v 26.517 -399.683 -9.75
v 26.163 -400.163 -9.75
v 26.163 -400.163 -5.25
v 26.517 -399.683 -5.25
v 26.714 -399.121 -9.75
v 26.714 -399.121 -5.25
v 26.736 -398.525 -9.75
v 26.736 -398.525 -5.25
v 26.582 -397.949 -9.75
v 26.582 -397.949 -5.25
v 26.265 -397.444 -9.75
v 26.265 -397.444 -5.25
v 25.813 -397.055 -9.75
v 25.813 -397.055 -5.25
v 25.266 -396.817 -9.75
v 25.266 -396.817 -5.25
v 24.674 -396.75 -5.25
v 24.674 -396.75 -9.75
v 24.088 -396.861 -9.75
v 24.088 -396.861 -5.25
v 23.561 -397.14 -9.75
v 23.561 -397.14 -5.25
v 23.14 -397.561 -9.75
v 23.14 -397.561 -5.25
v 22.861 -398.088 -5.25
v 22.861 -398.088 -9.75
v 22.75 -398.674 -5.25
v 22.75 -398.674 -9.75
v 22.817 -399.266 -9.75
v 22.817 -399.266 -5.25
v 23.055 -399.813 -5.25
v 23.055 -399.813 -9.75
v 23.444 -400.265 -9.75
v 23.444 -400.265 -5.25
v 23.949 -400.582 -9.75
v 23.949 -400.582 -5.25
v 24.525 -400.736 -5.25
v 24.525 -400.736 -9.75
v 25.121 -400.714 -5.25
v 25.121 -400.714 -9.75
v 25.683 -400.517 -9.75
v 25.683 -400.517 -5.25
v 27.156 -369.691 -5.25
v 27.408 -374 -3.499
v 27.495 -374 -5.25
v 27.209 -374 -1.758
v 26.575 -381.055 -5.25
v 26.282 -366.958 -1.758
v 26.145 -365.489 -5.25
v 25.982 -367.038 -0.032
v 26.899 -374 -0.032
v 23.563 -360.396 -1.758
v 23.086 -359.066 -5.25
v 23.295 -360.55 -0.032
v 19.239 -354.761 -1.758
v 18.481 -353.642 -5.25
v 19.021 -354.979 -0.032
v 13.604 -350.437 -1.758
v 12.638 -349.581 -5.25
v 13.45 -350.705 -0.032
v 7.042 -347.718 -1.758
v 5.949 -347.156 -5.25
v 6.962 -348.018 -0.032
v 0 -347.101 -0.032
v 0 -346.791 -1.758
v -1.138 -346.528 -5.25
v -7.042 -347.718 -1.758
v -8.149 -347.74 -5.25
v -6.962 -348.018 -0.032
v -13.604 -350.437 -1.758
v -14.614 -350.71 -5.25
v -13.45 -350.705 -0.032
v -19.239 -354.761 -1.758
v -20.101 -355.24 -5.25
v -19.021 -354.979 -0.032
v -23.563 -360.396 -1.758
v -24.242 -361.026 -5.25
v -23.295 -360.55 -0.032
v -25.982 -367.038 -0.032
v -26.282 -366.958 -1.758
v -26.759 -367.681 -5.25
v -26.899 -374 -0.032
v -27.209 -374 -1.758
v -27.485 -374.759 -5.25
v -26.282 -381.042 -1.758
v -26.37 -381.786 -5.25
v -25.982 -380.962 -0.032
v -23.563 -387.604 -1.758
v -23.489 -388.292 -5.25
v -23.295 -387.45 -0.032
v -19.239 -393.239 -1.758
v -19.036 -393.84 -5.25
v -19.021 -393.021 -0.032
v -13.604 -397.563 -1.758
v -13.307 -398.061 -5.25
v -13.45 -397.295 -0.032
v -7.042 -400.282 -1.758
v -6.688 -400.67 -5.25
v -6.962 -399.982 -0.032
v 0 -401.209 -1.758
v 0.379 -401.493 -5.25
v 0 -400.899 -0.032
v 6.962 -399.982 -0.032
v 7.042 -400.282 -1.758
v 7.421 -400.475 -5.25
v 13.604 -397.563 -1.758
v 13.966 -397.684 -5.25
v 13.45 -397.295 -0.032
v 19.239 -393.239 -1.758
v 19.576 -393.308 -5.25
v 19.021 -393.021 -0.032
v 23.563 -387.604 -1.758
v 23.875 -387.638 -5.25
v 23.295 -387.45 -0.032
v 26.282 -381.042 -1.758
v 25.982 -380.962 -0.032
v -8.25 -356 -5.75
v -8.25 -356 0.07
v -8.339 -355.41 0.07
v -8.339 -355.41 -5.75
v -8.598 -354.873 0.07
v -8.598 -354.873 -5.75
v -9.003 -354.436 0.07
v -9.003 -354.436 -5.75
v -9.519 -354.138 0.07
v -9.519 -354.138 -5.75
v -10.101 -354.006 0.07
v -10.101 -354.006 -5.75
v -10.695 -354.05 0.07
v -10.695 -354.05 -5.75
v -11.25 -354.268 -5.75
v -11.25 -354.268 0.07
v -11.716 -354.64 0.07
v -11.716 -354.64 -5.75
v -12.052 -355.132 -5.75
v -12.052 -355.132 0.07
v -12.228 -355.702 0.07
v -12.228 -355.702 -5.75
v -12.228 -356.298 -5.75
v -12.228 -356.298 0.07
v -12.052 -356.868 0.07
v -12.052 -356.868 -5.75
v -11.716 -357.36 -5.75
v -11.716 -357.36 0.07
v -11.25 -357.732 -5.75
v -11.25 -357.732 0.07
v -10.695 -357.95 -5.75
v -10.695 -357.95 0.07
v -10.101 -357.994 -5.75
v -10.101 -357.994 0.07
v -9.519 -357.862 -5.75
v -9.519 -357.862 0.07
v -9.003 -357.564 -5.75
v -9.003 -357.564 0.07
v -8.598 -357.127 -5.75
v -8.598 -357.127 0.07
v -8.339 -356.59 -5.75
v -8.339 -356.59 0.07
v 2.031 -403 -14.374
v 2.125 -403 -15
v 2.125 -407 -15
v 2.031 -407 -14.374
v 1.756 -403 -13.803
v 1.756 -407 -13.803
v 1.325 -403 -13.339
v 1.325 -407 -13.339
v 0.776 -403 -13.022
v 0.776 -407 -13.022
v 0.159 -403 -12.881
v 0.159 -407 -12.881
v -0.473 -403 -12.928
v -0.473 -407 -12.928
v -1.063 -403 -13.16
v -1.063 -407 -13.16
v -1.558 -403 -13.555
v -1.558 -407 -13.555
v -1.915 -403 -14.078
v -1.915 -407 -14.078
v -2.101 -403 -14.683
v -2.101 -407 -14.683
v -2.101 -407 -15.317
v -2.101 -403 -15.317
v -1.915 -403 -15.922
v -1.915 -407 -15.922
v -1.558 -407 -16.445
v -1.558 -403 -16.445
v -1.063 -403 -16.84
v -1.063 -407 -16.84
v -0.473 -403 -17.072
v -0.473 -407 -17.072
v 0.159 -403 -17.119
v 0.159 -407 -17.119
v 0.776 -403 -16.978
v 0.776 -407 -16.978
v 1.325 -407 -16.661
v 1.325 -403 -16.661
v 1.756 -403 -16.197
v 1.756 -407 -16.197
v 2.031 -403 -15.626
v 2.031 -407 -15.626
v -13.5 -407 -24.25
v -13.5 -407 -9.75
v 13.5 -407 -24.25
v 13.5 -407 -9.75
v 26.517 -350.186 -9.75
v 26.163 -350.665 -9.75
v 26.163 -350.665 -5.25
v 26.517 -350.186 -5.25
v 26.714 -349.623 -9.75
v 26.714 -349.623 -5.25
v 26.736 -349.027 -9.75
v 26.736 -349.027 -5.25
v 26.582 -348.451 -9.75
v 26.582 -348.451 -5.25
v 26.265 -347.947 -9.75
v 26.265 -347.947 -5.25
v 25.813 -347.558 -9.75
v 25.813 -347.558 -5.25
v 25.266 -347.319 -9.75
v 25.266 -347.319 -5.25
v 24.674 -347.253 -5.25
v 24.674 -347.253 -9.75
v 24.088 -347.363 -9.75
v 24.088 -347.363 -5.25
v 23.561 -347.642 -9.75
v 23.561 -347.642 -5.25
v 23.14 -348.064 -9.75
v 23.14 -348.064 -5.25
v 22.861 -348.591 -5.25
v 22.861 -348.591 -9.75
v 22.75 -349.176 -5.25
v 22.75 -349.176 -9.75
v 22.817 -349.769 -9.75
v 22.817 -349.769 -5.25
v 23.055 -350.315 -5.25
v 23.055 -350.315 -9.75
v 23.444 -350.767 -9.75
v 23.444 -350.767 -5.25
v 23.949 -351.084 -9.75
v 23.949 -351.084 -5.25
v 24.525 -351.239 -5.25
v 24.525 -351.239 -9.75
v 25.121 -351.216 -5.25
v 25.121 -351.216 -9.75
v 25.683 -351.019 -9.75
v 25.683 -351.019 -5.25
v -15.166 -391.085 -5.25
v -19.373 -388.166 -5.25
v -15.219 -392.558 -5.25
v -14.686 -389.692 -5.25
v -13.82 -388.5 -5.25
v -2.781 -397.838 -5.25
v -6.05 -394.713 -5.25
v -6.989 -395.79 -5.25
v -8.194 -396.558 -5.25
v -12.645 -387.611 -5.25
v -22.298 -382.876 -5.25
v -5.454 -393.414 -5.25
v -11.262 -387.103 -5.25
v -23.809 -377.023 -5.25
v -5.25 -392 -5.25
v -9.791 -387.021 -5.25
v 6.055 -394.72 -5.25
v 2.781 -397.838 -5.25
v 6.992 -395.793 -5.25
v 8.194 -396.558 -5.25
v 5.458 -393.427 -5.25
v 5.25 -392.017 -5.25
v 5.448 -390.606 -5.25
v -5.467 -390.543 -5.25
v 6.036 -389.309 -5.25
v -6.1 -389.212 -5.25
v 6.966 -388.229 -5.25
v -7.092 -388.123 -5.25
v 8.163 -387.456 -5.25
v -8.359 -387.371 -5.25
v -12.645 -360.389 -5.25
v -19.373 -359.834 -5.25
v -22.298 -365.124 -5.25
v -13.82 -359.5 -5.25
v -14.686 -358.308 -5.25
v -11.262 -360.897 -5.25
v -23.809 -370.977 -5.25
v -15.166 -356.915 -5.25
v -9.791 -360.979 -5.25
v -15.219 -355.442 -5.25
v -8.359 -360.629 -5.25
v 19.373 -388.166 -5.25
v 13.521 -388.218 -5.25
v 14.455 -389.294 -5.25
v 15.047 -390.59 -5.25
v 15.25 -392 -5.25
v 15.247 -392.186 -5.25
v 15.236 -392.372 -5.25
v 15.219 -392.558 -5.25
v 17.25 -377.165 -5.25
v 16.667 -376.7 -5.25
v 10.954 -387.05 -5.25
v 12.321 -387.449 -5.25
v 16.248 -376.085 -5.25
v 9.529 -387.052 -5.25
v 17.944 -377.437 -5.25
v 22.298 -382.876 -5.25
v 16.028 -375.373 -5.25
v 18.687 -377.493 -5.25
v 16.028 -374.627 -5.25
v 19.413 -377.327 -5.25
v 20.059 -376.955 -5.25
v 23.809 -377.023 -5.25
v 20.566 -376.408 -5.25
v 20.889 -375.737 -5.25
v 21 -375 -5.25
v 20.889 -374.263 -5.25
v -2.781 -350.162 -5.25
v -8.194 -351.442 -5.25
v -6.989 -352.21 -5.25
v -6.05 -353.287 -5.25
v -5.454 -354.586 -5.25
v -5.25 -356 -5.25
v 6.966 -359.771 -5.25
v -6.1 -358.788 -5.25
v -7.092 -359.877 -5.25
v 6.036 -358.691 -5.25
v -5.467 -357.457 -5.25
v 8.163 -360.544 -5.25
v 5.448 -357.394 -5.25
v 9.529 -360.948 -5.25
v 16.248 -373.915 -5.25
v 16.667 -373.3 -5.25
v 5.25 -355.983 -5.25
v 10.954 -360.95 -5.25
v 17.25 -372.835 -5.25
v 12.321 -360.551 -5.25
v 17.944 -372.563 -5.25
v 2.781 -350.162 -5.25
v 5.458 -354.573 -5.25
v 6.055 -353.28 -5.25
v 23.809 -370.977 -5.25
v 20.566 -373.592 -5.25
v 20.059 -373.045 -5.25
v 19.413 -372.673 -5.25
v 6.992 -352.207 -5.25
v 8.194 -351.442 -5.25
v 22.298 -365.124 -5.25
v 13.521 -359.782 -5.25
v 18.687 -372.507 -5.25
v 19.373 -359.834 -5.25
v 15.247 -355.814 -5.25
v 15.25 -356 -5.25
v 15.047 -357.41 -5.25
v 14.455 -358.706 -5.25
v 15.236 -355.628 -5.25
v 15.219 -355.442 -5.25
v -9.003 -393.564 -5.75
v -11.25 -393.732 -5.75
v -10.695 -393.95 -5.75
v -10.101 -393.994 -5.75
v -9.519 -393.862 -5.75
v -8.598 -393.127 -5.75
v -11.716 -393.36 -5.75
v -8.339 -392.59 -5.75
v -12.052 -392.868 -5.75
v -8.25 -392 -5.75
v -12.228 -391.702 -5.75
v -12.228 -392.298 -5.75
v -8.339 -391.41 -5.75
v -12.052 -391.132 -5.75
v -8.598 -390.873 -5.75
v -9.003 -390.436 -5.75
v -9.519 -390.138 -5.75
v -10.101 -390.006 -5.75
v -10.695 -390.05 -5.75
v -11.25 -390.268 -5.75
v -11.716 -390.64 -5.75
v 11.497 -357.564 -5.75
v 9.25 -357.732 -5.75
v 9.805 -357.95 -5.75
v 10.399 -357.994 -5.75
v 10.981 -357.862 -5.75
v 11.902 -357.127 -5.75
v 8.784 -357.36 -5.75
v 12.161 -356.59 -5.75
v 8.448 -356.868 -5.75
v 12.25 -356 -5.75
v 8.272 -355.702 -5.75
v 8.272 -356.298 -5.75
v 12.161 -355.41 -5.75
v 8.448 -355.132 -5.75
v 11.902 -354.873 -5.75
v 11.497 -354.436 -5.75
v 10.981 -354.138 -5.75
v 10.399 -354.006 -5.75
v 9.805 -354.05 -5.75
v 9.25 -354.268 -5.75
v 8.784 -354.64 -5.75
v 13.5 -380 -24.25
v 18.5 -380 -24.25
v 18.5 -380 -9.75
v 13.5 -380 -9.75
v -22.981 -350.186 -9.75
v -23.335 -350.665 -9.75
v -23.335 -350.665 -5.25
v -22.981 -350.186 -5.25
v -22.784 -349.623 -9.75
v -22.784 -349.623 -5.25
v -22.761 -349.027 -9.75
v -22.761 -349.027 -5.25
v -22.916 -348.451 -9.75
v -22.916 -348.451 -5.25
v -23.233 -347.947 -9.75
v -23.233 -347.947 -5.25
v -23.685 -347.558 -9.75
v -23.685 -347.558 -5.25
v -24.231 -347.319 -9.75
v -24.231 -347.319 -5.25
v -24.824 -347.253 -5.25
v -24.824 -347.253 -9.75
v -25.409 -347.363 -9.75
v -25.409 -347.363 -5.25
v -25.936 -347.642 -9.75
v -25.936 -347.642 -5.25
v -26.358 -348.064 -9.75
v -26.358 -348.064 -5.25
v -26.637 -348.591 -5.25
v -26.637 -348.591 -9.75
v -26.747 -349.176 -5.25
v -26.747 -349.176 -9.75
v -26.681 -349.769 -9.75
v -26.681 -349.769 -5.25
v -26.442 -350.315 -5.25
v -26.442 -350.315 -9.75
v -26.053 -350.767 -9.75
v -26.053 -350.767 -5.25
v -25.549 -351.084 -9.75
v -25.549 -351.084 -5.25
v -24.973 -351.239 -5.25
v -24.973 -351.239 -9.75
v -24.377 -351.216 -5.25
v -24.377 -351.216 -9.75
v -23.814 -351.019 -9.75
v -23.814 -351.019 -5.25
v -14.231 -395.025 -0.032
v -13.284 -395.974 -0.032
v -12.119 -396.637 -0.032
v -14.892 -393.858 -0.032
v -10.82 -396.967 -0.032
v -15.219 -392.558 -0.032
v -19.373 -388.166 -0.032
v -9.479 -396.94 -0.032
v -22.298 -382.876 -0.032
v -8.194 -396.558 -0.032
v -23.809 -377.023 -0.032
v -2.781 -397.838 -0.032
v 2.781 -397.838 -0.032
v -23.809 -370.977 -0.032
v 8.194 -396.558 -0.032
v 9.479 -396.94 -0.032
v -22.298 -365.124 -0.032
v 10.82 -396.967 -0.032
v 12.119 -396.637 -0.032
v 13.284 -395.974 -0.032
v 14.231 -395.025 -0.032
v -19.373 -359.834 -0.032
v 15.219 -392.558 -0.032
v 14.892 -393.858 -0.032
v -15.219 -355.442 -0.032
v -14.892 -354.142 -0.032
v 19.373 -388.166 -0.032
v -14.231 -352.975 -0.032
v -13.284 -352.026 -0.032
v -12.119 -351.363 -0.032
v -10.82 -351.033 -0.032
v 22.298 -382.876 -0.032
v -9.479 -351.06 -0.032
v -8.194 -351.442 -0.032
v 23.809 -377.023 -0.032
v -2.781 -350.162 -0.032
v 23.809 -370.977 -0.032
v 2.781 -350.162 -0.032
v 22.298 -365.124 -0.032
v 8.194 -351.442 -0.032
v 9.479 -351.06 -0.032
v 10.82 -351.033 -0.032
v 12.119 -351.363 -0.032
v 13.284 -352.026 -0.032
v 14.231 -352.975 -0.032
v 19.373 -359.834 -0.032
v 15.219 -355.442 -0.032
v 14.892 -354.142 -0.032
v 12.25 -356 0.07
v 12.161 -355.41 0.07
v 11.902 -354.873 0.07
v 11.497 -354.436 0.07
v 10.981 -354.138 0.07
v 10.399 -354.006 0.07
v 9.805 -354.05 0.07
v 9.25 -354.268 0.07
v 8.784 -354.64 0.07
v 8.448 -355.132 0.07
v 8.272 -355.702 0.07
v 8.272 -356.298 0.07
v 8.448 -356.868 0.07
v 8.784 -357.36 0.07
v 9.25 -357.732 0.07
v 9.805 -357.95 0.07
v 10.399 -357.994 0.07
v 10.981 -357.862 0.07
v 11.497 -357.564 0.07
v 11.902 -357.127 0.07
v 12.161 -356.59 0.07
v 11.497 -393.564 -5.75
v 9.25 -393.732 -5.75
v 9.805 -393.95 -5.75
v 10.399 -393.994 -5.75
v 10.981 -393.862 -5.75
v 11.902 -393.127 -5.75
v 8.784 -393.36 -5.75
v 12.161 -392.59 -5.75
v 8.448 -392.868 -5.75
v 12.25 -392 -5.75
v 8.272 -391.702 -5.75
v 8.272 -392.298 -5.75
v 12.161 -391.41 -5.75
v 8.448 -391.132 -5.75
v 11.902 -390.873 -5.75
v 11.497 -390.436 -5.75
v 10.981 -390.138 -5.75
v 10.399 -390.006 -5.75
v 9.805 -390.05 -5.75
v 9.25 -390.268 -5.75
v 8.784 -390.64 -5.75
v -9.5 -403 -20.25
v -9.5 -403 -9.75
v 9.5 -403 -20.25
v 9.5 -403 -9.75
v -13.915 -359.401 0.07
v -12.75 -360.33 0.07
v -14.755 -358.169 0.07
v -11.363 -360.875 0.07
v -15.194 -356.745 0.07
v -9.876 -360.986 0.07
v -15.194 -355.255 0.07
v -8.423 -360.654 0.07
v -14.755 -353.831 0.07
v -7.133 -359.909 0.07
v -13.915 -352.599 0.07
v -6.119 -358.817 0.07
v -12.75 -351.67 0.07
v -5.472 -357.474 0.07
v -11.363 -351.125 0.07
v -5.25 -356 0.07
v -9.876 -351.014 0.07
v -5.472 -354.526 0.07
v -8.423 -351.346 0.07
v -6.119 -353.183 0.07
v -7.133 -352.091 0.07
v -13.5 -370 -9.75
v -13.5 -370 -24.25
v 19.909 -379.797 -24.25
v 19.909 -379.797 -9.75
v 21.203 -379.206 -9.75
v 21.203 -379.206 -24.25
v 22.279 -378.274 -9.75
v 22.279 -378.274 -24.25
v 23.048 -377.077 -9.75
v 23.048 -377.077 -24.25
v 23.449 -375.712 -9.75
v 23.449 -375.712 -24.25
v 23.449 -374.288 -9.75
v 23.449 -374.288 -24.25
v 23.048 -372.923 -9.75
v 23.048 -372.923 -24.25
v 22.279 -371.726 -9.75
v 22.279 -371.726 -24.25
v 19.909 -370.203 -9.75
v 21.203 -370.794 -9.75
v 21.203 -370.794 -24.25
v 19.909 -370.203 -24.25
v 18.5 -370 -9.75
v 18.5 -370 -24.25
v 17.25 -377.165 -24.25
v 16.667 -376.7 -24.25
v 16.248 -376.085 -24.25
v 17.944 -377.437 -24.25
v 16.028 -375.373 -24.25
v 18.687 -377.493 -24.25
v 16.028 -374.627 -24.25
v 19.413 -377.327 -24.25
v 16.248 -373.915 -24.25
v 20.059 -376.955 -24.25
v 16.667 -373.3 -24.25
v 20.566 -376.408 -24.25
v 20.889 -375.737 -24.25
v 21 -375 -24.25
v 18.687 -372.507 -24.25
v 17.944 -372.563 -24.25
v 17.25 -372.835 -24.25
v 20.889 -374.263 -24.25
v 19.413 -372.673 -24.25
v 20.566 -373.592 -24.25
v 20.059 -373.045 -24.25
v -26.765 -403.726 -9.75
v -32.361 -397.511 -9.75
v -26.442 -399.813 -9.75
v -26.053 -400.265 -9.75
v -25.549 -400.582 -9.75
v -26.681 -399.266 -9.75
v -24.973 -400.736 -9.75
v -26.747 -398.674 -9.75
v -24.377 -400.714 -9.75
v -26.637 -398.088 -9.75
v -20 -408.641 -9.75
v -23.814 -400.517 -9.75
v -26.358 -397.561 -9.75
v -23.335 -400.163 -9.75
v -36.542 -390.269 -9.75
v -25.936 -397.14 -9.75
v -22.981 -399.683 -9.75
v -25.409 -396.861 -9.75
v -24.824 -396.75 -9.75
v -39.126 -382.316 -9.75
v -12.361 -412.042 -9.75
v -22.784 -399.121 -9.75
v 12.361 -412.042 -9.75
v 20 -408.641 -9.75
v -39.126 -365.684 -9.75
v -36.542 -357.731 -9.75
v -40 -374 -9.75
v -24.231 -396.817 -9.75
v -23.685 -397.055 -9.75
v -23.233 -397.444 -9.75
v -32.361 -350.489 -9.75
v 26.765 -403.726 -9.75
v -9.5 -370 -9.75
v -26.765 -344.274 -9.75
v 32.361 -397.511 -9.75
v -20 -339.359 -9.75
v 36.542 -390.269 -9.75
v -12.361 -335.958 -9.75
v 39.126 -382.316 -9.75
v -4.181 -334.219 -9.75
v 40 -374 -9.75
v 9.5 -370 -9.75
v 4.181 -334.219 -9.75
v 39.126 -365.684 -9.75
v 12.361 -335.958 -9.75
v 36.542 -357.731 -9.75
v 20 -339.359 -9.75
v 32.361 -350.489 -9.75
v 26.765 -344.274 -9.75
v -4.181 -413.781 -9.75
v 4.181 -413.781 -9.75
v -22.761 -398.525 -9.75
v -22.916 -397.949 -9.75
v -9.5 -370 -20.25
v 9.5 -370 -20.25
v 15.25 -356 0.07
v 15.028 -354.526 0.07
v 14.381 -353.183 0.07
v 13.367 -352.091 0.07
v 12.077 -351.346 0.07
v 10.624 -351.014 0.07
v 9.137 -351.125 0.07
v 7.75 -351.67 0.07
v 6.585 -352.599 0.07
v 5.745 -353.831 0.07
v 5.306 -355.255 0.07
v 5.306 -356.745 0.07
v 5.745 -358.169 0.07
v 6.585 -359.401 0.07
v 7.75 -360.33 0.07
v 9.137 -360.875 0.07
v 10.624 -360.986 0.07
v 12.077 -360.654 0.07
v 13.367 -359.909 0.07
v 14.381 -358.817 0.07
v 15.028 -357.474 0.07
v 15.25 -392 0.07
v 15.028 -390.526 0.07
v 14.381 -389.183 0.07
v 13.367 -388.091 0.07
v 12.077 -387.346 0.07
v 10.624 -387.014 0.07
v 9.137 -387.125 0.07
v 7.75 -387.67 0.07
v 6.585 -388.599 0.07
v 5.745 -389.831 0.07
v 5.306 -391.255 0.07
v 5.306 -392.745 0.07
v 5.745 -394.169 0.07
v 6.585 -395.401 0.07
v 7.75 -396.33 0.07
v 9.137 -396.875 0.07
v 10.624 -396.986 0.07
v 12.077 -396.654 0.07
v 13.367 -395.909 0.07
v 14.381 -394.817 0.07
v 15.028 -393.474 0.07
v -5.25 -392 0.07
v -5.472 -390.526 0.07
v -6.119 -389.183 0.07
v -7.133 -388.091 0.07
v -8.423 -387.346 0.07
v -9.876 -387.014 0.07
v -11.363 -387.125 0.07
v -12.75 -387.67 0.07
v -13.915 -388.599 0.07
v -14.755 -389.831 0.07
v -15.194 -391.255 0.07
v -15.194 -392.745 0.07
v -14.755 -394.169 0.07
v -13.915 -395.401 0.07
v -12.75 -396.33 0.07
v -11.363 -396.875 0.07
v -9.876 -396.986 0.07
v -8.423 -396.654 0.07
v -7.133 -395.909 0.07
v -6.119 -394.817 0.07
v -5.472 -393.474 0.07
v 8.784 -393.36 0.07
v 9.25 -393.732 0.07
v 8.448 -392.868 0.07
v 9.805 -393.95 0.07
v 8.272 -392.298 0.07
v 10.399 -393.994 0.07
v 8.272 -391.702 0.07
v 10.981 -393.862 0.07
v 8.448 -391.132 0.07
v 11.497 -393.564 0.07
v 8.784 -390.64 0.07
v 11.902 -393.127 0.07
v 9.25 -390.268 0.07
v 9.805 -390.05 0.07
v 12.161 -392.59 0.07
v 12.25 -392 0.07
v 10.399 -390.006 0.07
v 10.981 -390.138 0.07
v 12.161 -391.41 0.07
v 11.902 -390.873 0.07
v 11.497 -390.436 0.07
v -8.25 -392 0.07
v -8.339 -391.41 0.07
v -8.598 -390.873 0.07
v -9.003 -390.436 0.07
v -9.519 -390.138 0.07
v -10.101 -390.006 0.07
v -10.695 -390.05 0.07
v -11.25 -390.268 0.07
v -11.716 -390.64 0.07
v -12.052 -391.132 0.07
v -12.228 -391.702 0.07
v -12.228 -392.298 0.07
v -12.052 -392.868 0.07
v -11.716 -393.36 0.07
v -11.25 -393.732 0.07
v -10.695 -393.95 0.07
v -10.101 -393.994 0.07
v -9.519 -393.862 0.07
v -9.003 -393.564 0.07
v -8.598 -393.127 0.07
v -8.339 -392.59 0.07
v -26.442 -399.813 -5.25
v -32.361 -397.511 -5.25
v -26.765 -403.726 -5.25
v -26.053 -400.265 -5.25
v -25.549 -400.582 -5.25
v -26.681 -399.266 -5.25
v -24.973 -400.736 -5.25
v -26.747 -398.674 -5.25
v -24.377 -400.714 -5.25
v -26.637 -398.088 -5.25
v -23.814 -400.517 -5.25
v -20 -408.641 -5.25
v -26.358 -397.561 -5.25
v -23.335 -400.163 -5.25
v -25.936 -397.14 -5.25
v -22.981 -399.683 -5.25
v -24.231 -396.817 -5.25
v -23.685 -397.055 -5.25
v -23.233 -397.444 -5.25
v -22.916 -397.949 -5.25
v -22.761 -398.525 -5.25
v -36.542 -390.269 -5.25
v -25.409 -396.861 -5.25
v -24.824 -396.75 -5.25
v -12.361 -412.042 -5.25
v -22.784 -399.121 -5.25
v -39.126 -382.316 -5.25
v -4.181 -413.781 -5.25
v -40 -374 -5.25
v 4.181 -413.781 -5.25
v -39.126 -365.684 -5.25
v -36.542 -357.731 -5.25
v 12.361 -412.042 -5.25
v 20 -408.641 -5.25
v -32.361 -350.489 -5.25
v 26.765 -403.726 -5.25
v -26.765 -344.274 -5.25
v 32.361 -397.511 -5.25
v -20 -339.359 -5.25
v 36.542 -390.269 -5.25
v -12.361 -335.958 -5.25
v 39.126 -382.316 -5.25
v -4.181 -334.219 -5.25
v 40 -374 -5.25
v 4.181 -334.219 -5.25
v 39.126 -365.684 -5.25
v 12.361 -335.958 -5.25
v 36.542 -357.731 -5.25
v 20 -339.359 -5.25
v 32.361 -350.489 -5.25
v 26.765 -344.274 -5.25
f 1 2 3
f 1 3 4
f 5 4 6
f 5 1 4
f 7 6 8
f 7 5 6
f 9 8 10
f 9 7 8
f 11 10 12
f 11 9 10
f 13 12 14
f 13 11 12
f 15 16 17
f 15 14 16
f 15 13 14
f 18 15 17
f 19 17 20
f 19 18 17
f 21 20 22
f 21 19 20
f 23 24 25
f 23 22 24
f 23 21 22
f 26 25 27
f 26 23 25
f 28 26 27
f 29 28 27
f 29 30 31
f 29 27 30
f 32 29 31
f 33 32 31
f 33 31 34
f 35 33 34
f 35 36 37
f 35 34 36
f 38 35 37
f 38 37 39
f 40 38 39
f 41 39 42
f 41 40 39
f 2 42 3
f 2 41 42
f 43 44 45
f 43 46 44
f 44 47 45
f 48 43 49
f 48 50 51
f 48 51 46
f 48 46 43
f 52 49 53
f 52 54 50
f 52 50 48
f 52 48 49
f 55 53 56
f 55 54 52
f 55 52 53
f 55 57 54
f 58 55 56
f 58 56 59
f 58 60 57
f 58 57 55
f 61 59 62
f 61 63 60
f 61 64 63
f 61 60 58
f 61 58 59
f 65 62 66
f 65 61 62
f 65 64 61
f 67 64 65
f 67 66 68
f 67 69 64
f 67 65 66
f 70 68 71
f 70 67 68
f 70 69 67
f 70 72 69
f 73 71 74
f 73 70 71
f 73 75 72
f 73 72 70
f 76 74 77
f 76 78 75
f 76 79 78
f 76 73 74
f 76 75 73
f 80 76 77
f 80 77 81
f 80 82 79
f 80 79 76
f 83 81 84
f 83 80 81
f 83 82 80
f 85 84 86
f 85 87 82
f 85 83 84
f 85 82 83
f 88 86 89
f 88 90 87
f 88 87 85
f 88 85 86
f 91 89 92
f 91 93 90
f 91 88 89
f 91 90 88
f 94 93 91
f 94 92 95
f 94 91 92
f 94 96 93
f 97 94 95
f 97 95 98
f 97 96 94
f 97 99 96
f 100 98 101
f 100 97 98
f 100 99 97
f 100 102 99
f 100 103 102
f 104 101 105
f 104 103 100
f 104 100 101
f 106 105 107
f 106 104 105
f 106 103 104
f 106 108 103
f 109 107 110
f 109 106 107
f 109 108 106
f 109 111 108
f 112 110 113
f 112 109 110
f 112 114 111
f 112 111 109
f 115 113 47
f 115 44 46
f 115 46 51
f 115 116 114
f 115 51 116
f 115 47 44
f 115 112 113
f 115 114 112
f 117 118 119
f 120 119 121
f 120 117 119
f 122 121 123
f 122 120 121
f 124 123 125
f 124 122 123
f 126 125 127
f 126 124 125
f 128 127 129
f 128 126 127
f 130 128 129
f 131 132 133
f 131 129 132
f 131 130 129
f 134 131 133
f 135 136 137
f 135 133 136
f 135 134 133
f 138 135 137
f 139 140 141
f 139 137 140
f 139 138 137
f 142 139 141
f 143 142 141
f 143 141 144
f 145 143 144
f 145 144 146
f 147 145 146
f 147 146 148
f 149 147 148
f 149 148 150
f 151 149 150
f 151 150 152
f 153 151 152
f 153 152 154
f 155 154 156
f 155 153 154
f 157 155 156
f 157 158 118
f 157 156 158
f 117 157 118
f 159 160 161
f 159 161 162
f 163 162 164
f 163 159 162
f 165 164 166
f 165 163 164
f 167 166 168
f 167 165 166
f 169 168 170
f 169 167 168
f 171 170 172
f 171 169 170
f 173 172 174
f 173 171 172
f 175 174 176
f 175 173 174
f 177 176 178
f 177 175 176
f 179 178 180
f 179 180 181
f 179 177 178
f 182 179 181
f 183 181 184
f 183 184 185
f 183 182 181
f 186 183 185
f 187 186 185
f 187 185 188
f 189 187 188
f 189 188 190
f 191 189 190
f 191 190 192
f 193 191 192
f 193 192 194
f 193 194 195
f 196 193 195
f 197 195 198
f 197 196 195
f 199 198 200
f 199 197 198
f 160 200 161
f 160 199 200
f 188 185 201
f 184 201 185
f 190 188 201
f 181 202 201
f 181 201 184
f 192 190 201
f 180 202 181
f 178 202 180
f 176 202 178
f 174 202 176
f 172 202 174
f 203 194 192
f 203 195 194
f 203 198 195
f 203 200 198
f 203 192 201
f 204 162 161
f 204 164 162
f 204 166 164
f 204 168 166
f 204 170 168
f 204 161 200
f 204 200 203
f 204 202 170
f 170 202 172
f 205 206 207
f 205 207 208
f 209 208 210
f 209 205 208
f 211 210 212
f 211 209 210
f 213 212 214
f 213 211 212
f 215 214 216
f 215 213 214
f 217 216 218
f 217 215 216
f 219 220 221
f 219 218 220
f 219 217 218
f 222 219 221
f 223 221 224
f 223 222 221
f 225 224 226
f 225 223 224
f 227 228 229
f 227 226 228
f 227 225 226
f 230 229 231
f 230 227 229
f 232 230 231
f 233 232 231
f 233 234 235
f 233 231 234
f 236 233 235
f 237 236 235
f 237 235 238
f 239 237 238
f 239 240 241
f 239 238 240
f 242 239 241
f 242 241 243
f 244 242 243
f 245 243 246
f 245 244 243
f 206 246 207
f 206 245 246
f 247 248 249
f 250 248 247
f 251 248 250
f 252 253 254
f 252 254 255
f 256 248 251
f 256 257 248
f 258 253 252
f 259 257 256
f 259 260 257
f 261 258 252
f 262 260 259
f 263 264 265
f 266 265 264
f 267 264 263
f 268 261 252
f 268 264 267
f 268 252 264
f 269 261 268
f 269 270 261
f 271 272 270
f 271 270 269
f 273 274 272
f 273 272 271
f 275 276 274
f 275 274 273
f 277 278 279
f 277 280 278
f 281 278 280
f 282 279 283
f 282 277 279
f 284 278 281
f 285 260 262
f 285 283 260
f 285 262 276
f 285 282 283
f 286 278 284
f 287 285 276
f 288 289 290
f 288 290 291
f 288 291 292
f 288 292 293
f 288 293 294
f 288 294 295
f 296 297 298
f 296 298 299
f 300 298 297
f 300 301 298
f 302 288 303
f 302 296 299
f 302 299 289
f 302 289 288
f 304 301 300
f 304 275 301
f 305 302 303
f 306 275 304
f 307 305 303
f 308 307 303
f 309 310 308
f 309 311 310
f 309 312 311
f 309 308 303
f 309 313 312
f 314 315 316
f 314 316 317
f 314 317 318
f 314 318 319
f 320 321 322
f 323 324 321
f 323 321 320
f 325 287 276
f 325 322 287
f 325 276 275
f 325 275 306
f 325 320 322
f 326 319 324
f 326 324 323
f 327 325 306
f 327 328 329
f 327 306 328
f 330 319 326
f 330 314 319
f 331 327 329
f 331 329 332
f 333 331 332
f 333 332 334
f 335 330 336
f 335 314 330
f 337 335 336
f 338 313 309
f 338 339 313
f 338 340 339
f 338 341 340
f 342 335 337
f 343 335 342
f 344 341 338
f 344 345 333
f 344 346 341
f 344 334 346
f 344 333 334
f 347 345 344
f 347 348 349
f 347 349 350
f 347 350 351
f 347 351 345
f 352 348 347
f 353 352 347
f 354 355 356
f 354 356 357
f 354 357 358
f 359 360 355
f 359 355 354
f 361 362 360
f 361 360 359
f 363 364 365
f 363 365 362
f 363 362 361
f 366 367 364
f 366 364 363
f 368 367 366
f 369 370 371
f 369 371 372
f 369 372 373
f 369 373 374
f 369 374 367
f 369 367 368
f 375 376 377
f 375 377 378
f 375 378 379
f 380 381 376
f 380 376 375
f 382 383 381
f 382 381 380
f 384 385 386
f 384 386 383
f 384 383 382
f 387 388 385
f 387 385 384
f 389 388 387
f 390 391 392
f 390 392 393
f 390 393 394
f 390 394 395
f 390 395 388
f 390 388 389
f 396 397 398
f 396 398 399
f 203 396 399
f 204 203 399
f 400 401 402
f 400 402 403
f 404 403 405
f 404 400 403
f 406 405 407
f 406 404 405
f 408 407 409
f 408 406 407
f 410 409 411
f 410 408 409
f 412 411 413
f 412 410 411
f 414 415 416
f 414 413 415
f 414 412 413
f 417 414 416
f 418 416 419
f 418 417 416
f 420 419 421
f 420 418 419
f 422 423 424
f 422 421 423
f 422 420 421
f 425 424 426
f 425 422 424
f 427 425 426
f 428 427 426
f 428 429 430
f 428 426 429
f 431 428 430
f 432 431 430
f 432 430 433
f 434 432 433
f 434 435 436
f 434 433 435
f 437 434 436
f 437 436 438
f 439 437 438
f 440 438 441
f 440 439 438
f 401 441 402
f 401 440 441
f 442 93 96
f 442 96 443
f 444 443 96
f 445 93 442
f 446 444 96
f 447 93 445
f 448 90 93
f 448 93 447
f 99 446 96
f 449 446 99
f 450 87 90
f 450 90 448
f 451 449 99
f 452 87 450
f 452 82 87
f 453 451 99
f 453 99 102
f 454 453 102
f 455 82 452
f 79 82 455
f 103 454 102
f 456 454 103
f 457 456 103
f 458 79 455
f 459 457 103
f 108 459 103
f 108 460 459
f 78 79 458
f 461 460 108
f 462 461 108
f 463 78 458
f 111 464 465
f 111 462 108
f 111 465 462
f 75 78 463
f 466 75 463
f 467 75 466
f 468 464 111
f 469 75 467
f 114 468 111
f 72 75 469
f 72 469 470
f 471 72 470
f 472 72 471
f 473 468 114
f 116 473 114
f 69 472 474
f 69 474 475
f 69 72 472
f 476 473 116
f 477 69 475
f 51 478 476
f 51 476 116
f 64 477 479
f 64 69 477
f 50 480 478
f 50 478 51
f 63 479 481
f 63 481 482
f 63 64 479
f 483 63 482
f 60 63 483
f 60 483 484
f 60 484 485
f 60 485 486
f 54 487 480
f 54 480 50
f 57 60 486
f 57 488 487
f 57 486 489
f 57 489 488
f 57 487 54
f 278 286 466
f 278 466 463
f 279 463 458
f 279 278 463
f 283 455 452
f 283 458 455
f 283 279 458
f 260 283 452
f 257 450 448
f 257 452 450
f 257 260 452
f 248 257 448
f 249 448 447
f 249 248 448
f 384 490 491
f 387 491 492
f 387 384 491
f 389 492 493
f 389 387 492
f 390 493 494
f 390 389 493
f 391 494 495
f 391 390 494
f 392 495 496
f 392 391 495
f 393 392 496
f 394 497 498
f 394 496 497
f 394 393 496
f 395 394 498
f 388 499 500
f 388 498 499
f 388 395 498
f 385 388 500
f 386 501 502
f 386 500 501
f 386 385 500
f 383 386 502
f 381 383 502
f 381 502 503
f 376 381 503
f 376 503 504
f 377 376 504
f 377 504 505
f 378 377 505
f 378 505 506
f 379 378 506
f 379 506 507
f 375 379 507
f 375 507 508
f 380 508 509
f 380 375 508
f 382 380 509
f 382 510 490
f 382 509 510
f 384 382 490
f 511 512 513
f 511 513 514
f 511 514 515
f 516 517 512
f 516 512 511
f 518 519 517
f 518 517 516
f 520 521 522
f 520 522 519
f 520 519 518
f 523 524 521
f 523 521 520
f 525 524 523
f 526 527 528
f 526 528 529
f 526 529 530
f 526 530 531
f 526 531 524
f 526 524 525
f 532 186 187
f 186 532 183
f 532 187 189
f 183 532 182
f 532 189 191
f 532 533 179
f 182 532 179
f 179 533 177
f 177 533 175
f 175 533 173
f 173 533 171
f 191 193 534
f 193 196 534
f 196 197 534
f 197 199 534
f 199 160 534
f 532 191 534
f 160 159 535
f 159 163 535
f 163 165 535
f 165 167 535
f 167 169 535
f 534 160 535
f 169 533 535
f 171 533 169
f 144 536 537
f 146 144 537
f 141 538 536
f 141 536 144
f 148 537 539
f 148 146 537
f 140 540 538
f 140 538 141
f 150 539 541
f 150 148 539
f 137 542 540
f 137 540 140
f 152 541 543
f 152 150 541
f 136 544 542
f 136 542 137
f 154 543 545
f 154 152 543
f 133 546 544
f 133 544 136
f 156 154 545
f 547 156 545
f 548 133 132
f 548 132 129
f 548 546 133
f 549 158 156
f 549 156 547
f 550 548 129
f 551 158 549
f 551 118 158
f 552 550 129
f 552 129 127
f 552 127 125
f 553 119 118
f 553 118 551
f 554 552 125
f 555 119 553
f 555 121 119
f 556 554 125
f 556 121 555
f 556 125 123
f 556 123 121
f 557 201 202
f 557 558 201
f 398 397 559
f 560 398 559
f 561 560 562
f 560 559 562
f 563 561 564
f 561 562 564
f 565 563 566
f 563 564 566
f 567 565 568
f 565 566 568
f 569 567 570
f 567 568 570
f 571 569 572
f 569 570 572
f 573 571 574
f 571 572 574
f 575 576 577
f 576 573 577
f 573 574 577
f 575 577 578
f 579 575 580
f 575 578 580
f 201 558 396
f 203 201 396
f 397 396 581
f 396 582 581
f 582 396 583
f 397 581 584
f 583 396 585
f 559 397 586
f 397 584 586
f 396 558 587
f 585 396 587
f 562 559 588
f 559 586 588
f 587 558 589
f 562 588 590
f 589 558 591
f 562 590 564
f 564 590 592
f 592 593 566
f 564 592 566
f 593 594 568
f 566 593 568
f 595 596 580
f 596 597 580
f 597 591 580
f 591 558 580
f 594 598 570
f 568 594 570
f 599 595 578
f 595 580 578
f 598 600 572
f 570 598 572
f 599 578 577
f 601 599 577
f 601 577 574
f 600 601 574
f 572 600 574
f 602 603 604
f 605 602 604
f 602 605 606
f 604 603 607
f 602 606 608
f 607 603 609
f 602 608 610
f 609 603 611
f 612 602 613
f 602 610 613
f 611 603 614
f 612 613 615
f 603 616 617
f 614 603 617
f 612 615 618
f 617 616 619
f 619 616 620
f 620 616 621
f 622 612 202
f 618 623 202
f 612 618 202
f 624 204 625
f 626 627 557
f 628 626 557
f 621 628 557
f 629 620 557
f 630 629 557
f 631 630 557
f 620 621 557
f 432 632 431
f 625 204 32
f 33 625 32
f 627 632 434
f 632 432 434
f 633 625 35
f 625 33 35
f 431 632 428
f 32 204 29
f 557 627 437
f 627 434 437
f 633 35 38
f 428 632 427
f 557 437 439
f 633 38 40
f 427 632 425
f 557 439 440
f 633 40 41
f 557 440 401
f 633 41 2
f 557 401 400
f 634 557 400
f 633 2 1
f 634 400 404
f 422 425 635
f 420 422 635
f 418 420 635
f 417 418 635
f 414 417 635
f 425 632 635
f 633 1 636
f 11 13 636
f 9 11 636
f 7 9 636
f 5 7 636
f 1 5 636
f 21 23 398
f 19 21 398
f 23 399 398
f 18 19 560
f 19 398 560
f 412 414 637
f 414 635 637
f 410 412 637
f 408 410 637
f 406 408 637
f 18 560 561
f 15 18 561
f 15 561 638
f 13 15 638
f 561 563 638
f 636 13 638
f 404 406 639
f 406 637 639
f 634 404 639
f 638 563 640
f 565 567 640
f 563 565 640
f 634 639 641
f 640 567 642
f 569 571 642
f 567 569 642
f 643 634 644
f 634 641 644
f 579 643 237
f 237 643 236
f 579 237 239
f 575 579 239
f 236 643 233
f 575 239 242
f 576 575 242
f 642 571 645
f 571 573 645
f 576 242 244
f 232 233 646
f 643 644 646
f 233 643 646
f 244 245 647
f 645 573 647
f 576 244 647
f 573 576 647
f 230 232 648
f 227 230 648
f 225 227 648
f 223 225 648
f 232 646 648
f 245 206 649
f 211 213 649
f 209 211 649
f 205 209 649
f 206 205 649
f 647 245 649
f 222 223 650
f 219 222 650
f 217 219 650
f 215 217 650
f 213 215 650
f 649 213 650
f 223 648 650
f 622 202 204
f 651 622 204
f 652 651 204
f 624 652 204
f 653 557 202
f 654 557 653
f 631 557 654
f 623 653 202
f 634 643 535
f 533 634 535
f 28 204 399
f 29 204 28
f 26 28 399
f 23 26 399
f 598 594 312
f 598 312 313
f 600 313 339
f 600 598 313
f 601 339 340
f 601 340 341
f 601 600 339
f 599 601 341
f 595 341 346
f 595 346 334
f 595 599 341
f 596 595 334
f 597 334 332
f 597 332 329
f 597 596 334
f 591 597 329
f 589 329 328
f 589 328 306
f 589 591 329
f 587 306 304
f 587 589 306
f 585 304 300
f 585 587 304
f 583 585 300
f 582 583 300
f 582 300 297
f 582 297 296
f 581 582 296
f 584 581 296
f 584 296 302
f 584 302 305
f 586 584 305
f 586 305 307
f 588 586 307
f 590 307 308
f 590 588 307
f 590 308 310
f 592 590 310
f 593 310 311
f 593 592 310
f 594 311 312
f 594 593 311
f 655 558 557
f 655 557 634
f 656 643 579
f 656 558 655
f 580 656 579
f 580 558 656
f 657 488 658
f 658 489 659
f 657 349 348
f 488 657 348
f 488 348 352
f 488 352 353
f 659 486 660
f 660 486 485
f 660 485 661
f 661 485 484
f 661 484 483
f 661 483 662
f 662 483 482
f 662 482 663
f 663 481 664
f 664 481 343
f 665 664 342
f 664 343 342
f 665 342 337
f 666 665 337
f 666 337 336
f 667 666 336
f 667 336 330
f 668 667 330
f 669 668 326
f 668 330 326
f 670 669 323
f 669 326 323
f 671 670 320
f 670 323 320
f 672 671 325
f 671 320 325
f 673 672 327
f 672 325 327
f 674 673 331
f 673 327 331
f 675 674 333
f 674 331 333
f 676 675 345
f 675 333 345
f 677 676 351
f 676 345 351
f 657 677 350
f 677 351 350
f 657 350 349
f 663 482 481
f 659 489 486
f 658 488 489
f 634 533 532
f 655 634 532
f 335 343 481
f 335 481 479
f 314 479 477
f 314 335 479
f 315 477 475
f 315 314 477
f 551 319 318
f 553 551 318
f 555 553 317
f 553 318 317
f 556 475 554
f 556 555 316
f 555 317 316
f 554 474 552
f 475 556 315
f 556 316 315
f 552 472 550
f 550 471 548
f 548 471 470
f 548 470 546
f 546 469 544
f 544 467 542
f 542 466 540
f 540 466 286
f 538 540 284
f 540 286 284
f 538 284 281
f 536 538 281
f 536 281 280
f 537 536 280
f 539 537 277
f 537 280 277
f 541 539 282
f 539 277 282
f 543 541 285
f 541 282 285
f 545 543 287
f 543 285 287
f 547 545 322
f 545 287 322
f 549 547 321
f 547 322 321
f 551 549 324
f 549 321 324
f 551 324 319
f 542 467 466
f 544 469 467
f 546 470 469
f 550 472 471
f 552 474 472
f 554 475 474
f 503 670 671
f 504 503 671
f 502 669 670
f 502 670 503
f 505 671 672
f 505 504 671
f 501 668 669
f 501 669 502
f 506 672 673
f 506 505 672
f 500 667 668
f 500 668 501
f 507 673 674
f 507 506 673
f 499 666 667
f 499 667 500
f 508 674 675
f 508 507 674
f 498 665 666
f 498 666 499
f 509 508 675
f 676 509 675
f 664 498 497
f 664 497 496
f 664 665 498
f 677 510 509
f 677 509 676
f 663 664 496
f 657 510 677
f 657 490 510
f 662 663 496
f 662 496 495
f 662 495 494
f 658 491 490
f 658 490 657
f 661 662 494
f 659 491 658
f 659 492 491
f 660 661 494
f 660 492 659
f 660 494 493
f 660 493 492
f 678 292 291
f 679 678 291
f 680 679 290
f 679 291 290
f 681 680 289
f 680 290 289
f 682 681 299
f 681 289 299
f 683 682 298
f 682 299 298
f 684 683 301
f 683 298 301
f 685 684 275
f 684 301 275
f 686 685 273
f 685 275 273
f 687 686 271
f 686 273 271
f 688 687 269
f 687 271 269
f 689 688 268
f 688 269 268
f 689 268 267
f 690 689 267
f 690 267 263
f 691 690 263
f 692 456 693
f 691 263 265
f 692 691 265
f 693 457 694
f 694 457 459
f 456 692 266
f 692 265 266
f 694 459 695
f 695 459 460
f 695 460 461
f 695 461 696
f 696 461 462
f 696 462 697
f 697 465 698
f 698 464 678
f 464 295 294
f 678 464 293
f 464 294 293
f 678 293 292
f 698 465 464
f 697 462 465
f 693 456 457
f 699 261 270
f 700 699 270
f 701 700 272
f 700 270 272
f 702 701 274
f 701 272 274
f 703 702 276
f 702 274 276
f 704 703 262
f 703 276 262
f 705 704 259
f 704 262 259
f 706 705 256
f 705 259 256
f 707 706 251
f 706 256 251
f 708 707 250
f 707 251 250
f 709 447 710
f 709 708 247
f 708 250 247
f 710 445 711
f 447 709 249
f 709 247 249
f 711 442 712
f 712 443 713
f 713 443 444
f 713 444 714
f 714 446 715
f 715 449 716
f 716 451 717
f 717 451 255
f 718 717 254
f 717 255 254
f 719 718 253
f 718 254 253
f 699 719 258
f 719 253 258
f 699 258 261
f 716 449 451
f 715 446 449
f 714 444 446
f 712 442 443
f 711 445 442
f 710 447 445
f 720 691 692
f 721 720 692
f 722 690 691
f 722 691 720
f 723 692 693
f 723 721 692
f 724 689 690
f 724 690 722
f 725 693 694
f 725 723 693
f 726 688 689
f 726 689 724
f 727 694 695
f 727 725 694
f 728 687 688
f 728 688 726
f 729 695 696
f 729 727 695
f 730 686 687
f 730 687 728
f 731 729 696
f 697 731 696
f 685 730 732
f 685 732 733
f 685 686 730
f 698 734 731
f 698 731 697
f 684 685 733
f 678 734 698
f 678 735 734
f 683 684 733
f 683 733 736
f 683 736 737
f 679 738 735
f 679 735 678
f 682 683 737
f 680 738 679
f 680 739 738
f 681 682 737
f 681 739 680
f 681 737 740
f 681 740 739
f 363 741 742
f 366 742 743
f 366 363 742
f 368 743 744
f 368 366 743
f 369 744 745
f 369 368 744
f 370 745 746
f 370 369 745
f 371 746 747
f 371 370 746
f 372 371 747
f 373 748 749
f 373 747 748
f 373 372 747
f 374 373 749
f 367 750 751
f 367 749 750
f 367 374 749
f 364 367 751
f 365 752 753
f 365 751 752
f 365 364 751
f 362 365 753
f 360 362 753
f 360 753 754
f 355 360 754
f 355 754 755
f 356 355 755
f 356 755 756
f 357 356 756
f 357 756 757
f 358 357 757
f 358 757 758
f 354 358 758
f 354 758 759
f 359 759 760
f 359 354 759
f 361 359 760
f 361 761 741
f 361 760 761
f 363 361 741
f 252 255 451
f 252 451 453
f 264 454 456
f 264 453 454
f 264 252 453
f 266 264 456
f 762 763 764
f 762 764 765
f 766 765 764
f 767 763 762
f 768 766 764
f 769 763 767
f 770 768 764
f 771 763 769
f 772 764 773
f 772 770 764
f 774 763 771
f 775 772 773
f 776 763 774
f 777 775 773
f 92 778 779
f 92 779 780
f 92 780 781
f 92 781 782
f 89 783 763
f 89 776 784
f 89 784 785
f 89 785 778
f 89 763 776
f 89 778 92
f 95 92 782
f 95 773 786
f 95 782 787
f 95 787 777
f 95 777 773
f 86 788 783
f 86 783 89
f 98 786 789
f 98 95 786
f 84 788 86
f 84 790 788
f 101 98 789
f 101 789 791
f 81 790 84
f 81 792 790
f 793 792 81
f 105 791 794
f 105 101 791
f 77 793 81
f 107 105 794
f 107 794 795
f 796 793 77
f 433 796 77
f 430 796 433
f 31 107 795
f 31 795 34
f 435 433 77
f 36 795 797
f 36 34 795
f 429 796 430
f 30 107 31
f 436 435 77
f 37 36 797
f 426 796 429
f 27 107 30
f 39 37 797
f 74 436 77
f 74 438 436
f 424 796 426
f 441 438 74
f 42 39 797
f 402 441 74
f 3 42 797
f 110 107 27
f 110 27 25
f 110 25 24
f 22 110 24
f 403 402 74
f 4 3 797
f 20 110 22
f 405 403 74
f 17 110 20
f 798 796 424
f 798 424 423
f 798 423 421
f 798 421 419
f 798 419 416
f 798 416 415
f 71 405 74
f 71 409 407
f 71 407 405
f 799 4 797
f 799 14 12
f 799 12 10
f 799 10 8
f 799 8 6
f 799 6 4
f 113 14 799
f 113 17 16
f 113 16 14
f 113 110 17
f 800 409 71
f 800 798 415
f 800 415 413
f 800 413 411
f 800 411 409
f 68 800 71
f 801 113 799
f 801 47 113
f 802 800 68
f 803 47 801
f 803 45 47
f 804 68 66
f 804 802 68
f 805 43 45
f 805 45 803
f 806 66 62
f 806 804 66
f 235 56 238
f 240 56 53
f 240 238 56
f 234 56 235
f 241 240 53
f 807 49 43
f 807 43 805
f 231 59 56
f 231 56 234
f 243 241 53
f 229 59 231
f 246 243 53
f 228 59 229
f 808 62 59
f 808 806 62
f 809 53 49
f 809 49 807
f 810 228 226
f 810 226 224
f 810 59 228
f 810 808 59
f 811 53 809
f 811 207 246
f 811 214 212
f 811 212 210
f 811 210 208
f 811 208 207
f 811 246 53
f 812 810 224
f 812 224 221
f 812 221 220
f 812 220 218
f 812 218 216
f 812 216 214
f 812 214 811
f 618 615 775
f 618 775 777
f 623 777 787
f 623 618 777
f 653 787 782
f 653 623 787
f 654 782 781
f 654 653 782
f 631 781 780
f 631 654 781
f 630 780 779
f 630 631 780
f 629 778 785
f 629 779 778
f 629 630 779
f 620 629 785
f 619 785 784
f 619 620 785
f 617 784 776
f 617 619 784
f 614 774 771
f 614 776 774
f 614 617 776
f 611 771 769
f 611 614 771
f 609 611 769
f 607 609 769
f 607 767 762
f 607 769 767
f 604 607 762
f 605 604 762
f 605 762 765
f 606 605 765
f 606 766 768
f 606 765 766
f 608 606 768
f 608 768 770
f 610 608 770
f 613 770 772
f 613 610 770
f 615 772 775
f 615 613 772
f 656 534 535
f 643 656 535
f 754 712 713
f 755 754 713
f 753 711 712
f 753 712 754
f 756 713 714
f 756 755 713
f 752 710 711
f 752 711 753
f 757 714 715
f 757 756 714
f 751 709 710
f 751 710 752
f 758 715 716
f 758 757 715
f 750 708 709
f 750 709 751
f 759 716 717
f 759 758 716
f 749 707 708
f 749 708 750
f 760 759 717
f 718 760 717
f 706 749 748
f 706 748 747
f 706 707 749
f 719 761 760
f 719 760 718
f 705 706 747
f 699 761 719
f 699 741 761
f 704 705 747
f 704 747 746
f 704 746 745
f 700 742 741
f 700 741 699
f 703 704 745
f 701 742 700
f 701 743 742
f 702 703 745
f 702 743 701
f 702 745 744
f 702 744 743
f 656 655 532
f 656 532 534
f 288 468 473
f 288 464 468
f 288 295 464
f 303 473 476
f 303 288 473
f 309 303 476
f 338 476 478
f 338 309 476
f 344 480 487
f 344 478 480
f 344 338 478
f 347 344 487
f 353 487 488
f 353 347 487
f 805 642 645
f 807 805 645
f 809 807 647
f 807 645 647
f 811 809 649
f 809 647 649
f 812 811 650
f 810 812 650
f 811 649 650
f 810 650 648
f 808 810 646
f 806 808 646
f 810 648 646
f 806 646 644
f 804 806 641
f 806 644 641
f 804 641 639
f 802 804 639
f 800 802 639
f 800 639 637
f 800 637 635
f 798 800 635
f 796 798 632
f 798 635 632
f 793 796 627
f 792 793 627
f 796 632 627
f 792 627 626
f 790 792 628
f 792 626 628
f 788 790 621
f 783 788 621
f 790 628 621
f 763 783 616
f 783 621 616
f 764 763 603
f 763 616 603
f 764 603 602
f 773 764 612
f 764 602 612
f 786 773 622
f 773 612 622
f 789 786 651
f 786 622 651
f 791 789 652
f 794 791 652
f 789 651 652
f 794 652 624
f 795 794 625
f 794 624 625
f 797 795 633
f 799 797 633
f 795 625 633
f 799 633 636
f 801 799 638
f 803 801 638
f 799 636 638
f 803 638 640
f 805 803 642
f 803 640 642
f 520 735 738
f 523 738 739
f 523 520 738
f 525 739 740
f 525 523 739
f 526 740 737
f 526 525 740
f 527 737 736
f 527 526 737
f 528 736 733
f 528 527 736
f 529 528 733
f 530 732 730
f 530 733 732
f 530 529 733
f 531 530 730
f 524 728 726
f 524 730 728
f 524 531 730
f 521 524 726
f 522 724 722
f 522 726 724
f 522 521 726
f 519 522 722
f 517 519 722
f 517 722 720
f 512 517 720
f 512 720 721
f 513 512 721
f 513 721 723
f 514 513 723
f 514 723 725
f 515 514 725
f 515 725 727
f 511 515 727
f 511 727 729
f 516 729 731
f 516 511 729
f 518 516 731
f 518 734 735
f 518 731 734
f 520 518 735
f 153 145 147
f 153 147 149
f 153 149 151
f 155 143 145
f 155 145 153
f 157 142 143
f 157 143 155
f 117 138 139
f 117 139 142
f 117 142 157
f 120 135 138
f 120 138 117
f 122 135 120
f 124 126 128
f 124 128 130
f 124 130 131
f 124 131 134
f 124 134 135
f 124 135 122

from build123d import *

# Parameters (mm, degrees)
SKETCH142_R               = 2.5
EXTRUDE046_DEPTH          = 19
EXTRUDE047_DEPTH          = 19
CYLINDER185_R             = 2
CYLINDER185_DEPTH         = 10
CYLINDER186_R             = 2
CYLINDER186_DEPTH         = 10
CYLINDER187_R             = 2
CYLINDER187_DEPTH         = 10
CYLINDER184_R             = 2
CYLINDER184_DEPTH         = 10
FUSION121_PLACEMENT_ANGLE = 45
CYLINDER180_R             = 2
CYLINDER180_DEPTH         = 10
CYLINDER181_R             = 2
CYLINDER181_DEPTH         = 10
CYLINDER182_R             = 2
CYLINDER182_DEPTH         = 10
CYLINDER183_R             = 2
CYLINDER183_DEPTH         = 10
CYLINDER170_R             = 2
CYLINDER170_DEPTH         = 10
CYLINDER171_R             = 2
CYLINDER171_DEPTH         = 10
CYLINDER172_R             = 2
CYLINDER172_DEPTH         = 10
CYLINDER169_R             = 2
CYLINDER169_DEPTH         = 10
FUSION111_PLACEMENT_ANGLE = 45
CYLINDER176_R             = 5
CYLINDER176_DEPTH         = 5.82
CYLINDER177_R             = 5
CYLINDER177_DEPTH         = 5.82
CYLINDER178_R             = 5
CYLINDER178_DEPTH         = 5.82
CYLINDER179_R             = 5
CYLINDER179_DEPTH         = 5.82
CYLINDER173_R             = 40
CYLINDER173_DEPTH         = 4.5
CYLINDER174_R             = 24
CYLINDER174_DEPTH         = 7
EXTRUDE044_DEPTH          = 33
SKETCH141_W               = 27
SKETCH141_H               = 14.5
SKETCH141_R               = 2.125
EXTRUDE045_DEPTH          = 4


with BuildPart() as lightwire:
    # Sketch142 → Extrude046 (new body)
    with BuildSketch(Plane.XY.offset(-24.25)):
        with Locations((18.5, -375)):
            Circle(SKETCH142_R)
    extrude(amount=EXTRUDE046_DEPTH)


with BuildPart() as extrude047:
    # Sketch143 → Extrude047 (new body)
    with BuildSketch(Plane.XY.offset(-24.25)):
        with BuildLine():
            ThreePointArc((18.5, -380), (23.5, -375), (18.5, -370))
            Line((13.5, -370), (18.5, -370))
            Line((13.5, -380), (13.5, -370))
            Line((18.5, -380), (13.5, -380))
        make_face()
    extrude(amount=EXTRUDE047_DEPTH)


with BuildPart() as m2heatsetinsets025:
    # Cylinder185 → Cylinder185 (new body)
    with BuildSketch(Plane(origin=(35, 0, 65), x_dir=(1, 0, 0), z_dir=(0, 0, 1))):
        Circle(CYLINDER185_R)
    extrude(amount=CYLINDER185_DEPTH)


with BuildPart() as m2heatsetinsets026:
    # Cylinder186 → Cylinder186 (new body)
    with BuildSketch(Plane(origin=(0, 35, 65), x_dir=(1, 0, 0), z_dir=(0, 0, 1))):
        Circle(CYLINDER186_R)
    extrude(amount=CYLINDER186_DEPTH)


with BuildPart() as m2heatsetinsets027:
    # Cylinder187 → Cylinder187 (new body)
    with BuildSketch(Plane(origin=(0, -35, 65), x_dir=(1, 0, 0), z_dir=(0, 0, 1))):
        Circle(CYLINDER187_R)
    extrude(amount=CYLINDER187_DEPTH)


with BuildPart() as fusion121:
    # Cylinder184 → Cylinder184 (new body)
    with BuildSketch(Plane(origin=(-35, 0, 65), x_dir=(1, 0, 0), z_dir=(0, 0, 1))):
        Circle(CYLINDER184_R)
    extrude(amount=CYLINDER184_DEPTH)

    # Fusion121: union m2HeatSetInsets025, m2HeatSetInsets026, m2HeatSetInsets027
    add(m2heatsetinsets025.part)
    add(m2heatsetinsets026.part)
    add(m2heatsetinsets027.part)


with BuildPart() as fusion121_1:
    # Fusion121 placement: moved
    add(fusion121.part.moved(Location((0, -374, -75))).rotate(Axis((0, -374, -75), (0, 0, -1)), FUSION121_PLACEMENT_ANGLE))


with BuildPart() as cylinder180:
    # Cylinder180 → Cylinder180 (new body)
    with BuildSketch(Plane(origin=(0, -21, 0), x_dir=(1, 0, 0), z_dir=(0, 0, 1))):
        Circle(CYLINDER180_R)
    extrude(amount=CYLINDER180_DEPTH)


with BuildPart() as m3heatsetcuts031:
    # Cylinder181 → Cylinder181 (new body)
    with BuildSketch(Plane(origin=(20.5, -21, 0), x_dir=(1, 0, 0), z_dir=(0, 0, 1))):
        Circle(CYLINDER181_R)
    extrude(amount=CYLINDER181_DEPTH)

    # Fusion118: union Cylinder180
    add(cylinder180.part)


with BuildPart() as m3heatsetcuts031_1:
    # Fusion118 placement: moved
    add(m3heatsetcuts031.part.moved(Location((-5, 39, 70))))


with BuildPart() as cylinder182:
    # Cylinder182 → Cylinder182 (new body)
    with BuildSketch(Plane(origin=(0, -21, 0), x_dir=(1, 0, 0), z_dir=(0, 0, 1))):
        Circle(CYLINDER182_R)
    extrude(amount=CYLINDER182_DEPTH)


with BuildPart() as m3heatsetcuts030:
    # Cylinder183 → Cylinder183 (new body)
    with BuildSketch(Plane(origin=(20.5, -21, 0), x_dir=(1, 0, 0), z_dir=(0, 0, 1))):
        Circle(CYLINDER183_R)
    extrude(amount=CYLINDER183_DEPTH)

    # Fusion119: union Cylinder182
    add(cylinder182.part)


with BuildPart() as m3heatsetcuts030_1:
    # Fusion119 placement: moved
    add(m3heatsetcuts030.part.moved(Location((-5, 3, 70))))

    # Fusion117: union m3HeatSetCuts031
    add(m3heatsetcuts031_1.part)


with BuildPart() as m3heatsetcuts030_2:
    # Fusion117 placement: moved
    add(m3heatsetcuts030_1.part.moved(Location((128.75, 10, -1))))


with BuildPart() as m2heatsetinsets021:
    # Cylinder170 → Cylinder170 (new body)
    with BuildSketch(Plane(origin=(35, 0, 65), x_dir=(1, 0, 0), z_dir=(0, 0, 1))):
        Circle(CYLINDER170_R)
    extrude(amount=CYLINDER170_DEPTH)


with BuildPart() as m2heatsetinsets022:
    # Cylinder171 → Cylinder171 (new body)
    with BuildSketch(Plane(origin=(0, 35, 65), x_dir=(1, 0, 0), z_dir=(0, 0, 1))):
        Circle(CYLINDER171_R)
    extrude(amount=CYLINDER171_DEPTH)


with BuildPart() as m2heatsetinsets023:
    # Cylinder172 → Cylinder172 (new body)
    with BuildSketch(Plane(origin=(0, -35, 65), x_dir=(1, 0, 0), z_dir=(0, 0, 1))):
        Circle(CYLINDER172_R)
    extrude(amount=CYLINDER172_DEPTH)


with BuildPart() as fusion120:
    # Cylinder169 → Cylinder169 (new body)
    with BuildSketch(Plane(origin=(-35, 0, 65), x_dir=(1, 0, 0), z_dir=(0, 0, 1))):
        Circle(CYLINDER169_R)
    extrude(amount=CYLINDER169_DEPTH)

    # Fusion111: union m2HeatSetInsets021, m2HeatSetInsets022, m2HeatSetInsets023
    add(m2heatsetinsets021.part)
    add(m2heatsetinsets022.part)
    add(m2heatsetinsets023.part)


with BuildPart() as fusion120_1:
    # Fusion111 placement: moved
    add(fusion120.part.moved(Location((0, -374, -75))).rotate(Axis((0, -374, -75), (0, 0, -1)), FUSION111_PLACEMENT_ANGLE))

    # Fusion120: union m3HeatSetCuts030
    add(m3heatsetcuts030_2.part)


with BuildPart() as cylinder176:
    # Cylinder176 → Cylinder176 (new body)
    with BuildSketch(Plane(origin=(0, -21, 0), x_dir=(1, 0, 0), z_dir=(0, 0, 1))):
        Circle(CYLINDER176_R)
    extrude(amount=CYLINDER176_DEPTH)


with BuildPart() as m3heatsetcuts027:
    # Cylinder177 → Cylinder177 (new body)
    with BuildSketch(Plane(origin=(20.5, -21, 0), x_dir=(1, 0, 0), z_dir=(0, 0, 1))):
        Circle(CYLINDER177_R)
    extrude(amount=CYLINDER177_DEPTH)

    # Fusion112: union Cylinder176
    add(cylinder176.part)


with BuildPart() as m3heatsetcuts027_1:
    # Fusion112 placement: moved
    add(m3heatsetcuts027.part.moved(Location((-5, 39, 70))))


with BuildPart() as cylinder178:
    # Cylinder178 → Cylinder178 (new body)
    with BuildSketch(Plane(origin=(0, -21, 0), x_dir=(1, 0, 0), z_dir=(0, 0, 1))):
        Circle(CYLINDER178_R)
    extrude(amount=CYLINDER178_DEPTH)


with BuildPart() as m3heatsetcuts029:
    # Cylinder179 → Cylinder179 (new body)
    with BuildSketch(Plane(origin=(20.5, -21, 0), x_dir=(1, 0, 0), z_dir=(0, 0, 1))):
        Circle(CYLINDER179_R)
    extrude(amount=CYLINDER179_DEPTH)

    # Fusion113: union Cylinder178
    add(cylinder178.part)


with BuildPart() as m3heatsetcuts029_1:
    # Fusion113 placement: moved
    add(m3heatsetcuts029.part.moved(Location((-5, 3, 70))))

    # Fusion114: union m3HeatSetCuts027
    add(m3heatsetcuts027_1.part)


with BuildPart() as m3heatsetcuts029_2:
    # Fusion114 placement: moved
    add(m3heatsetcuts029_1.part.moved(Location((128.75, 10, -1))))


with BuildPart() as base015:
    # Cylinder173 → Cylinder173 (new body)
    with BuildSketch(Plane(origin=(136, 0, 65), x_dir=(1, 0, 0), z_dir=(0, 0, 1))):
        Circle(CYLINDER173_R)
    extrude(amount=CYLINDER173_DEPTH)


with BuildPart() as basecut004:
    # Cylinder174 → Cylinder174 (new body)
    with BuildSketch(Plane(origin=(5, 0, 74), x_dir=(1, 0, 0), z_dir=(0, 0, 1))):
        Circle(CYLINDER174_R)
    extrude(amount=CYLINDER174_DEPTH)


with BuildPart() as lightmodule:
    # Sphere006 → Sphere006 (revolve)
    with BuildSketch(Plane(origin=(5, 0, 74), x_dir=(1, 0, 0), z_dir=(0, -1, 0))):
        with BuildLine():
            ThreePointArc((27.5, 0), (27.349352, 2.874533), (26.899059, 5.717571))
            Line((26.899059, 5.717571), (0, 5.717571))
            Line((0, 5.717571), (0, 0))
            Line((0, 0), (27.5, 0))
        make_face()
    revolve(axis=Axis((5, 0, 74), (0, 0, 1)))

    # Cut058: cut baseCut004
    add(basecut004.part, mode=Mode.SUBTRACT)


with BuildPart() as lightmodule_1:
    # Cut058 placement: moved
    add(lightmodule.part.moved(Location((131, 0, -5))))

    # Fusion115: union base015
    add(base015.part)


with BuildPart() as lightmodule_2:
    # Fusion115 placement: moved
    add(lightmodule_1.part.moved(Location((-2, 10, 0))))

    # Fusion116: union m3HeatSetCuts029
    add(m3heatsetcuts029_2.part)

    # Cut059: cut Fusion120
    add(fusion120_1.part, mode=Mode.SUBTRACT)


with BuildPart() as lightmodule_3:
    # Cut059 placement: moved
    add(lightmodule_2.part.moved(Location((-134, -384, -74.75))))

    # Cut060: cut Fusion121
    add(fusion121_1.part, mode=Mode.SUBTRACT)


with BuildPart() as extrude044:
    # Sketch140 → Extrude044 (new body)
    with BuildSketch(Plane.XZ.offset(370)):
        Polygon((-13.5, -9.75), (-9.5, -9.75), (-9.5, -20.25), (9.5, -20.25), (9.5, -9.75), (13.5, -9.75), (13.5, -24.25), (-13.5, -24.25), align=None)
    extrude(amount=EXTRUDE044_DEPTH)


with BuildPart() as lightmodule015:
    # Sketch141 → Extrude045 (new body)
    with BuildSketch(Plane.XZ.offset(403)):
        with Locations((0, -17)):
            Rectangle(SKETCH141_W, SKETCH141_H)
        with Locations((0, -15)):
            Circle(SKETCH141_R, mode=Mode.SUBTRACT)
    extrude(amount=EXTRUDE045_DEPTH)

    # Fusion122: union lightModule, Extrude044
    add(lightmodule_3.part)
    add(extrude044.part)

    # Fusion123: union Extrude047
    add(extrude047.part)

    # Cut061: cut lightWire
    add(lightwire.part, mode=Mode.SUBTRACT)


solid = lightmodule015.part
